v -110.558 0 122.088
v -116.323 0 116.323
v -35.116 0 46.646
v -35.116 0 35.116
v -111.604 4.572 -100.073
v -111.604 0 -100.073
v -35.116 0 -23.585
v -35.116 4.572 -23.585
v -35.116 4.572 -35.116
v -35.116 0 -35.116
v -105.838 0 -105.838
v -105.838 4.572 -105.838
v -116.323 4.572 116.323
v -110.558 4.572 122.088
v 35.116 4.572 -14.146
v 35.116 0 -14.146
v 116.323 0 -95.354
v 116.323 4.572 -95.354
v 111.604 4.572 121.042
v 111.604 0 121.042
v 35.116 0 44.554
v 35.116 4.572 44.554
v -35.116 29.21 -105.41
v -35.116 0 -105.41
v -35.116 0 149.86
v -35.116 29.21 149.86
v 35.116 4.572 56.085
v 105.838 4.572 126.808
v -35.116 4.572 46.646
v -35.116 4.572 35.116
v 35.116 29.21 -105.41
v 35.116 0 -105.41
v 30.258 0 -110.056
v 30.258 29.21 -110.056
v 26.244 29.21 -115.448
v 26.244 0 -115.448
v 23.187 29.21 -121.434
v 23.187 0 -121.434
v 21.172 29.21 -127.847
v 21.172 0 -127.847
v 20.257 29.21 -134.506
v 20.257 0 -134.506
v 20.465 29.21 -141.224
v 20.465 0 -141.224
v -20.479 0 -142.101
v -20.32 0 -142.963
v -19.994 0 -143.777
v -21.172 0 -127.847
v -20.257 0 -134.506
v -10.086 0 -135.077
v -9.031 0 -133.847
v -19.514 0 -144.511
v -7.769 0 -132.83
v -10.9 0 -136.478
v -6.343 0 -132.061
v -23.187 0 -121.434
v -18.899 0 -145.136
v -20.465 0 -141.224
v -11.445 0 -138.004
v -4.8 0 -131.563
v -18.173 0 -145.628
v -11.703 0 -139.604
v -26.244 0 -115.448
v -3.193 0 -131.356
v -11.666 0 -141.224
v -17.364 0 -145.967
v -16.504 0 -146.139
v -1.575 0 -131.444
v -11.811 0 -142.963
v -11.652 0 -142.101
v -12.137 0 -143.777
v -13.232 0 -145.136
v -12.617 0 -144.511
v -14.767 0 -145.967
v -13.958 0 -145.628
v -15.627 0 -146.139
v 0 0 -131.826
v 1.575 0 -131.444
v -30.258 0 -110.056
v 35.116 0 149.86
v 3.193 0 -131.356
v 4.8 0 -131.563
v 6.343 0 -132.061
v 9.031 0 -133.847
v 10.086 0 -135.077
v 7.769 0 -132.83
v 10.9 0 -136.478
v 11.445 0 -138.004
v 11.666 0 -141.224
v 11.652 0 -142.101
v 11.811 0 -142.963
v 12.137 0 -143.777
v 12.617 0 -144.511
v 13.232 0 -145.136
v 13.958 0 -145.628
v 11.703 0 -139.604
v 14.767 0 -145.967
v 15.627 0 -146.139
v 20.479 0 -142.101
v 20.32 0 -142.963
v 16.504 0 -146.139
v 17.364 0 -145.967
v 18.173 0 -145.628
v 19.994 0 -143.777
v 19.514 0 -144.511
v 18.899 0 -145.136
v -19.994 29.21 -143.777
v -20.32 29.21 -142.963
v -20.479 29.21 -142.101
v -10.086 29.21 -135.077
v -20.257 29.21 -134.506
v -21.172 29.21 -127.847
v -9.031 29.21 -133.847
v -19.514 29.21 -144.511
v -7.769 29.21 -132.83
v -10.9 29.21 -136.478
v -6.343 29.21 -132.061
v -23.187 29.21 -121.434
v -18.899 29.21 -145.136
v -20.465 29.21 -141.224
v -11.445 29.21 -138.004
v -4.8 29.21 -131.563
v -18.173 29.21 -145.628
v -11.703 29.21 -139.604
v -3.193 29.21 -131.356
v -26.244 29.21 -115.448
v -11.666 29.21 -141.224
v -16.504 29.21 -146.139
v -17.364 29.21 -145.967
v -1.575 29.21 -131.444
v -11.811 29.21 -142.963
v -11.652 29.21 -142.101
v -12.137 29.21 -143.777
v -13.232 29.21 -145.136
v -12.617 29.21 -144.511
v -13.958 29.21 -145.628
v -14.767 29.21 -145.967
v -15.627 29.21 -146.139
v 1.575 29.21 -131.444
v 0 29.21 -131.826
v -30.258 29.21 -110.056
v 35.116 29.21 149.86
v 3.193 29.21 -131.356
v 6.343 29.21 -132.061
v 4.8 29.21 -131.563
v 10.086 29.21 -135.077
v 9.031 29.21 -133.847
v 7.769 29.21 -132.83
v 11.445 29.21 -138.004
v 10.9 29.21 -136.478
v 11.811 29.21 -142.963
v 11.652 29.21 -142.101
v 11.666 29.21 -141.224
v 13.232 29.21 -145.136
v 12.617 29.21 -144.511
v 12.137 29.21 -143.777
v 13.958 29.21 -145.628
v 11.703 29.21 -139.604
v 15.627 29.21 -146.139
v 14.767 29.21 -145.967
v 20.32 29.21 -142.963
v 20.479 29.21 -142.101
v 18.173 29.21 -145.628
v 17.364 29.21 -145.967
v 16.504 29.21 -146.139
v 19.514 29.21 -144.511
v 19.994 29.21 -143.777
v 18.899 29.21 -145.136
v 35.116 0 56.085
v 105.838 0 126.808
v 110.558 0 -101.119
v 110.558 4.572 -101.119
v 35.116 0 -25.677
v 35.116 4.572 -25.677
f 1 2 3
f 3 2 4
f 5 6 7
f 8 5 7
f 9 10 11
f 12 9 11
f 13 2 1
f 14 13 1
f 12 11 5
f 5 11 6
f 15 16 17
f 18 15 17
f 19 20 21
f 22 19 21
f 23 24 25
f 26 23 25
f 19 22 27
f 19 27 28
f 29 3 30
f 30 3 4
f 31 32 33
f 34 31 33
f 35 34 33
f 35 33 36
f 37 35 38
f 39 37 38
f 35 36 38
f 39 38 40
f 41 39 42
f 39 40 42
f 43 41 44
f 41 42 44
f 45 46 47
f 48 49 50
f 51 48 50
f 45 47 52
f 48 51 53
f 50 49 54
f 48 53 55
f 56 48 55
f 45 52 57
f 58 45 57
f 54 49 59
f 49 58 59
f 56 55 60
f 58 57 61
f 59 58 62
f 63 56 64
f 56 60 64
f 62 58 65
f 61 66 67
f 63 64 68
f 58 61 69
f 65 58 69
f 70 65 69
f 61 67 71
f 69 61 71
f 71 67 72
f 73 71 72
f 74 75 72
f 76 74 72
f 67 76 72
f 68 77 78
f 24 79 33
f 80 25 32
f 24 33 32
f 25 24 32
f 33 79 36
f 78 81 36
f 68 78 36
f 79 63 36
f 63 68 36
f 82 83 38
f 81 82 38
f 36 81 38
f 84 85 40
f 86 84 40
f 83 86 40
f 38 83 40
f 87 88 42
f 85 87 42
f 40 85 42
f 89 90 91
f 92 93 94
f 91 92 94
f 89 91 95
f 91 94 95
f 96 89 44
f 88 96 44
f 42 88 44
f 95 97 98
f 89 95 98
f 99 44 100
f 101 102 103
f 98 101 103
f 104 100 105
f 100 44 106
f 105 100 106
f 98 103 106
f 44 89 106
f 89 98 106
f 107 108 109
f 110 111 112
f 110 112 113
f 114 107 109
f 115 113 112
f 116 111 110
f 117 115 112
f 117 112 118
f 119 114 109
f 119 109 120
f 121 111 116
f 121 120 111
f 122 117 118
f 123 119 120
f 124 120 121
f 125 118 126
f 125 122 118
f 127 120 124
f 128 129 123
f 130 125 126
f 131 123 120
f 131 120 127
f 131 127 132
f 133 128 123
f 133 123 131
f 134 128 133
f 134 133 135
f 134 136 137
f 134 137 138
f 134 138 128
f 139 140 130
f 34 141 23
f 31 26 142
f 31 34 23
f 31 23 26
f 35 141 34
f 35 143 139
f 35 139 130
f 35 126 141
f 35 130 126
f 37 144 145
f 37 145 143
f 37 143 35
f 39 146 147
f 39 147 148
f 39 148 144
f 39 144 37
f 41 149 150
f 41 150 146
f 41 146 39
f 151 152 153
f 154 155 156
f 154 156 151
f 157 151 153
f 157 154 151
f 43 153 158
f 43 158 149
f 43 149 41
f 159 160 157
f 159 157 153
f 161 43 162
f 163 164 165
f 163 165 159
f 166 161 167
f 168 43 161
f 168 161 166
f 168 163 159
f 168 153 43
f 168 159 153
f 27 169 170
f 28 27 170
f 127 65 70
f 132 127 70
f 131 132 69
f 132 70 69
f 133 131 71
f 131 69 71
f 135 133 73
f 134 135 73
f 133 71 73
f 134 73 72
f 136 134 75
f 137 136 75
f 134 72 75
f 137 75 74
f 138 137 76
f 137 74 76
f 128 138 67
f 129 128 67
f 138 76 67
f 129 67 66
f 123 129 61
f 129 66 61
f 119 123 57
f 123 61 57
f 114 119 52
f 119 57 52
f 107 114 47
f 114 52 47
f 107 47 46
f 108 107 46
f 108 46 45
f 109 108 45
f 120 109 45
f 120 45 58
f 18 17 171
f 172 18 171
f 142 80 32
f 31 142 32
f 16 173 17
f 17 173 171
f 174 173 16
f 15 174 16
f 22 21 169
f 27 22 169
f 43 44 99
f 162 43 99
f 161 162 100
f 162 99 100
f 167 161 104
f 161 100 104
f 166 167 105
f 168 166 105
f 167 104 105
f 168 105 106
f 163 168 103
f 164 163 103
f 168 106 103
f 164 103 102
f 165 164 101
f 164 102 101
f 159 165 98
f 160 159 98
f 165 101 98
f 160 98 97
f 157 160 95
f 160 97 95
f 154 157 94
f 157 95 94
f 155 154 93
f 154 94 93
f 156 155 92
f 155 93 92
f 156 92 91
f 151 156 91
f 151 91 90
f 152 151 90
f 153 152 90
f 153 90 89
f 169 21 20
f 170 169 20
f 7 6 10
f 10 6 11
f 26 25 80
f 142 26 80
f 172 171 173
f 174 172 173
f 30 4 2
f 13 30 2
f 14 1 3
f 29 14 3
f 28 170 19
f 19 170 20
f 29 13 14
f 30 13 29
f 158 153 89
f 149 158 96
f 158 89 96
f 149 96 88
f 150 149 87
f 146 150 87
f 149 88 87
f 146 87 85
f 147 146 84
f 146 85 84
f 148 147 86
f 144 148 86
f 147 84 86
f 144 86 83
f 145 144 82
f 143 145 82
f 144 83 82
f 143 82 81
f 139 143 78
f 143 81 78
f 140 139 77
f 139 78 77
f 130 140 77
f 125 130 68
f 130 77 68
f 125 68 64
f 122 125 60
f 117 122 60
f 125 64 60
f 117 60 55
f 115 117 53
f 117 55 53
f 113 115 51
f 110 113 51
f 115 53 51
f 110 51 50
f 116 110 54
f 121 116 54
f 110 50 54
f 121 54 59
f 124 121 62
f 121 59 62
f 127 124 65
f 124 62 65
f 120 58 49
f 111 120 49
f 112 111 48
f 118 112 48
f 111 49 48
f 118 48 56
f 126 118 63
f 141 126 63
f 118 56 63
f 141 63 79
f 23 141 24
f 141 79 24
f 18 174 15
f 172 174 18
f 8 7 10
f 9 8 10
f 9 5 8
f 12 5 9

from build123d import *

# Parameters (mm, degrees)
BODY_DEPTH     = 29.21
ARM4_START     = -30.861
SKETCH3_W      = 8.1534
SKETCH3_H      = 4.572
ARM4_DEPTH     = 132.461
ARMS_COUNT     = 4
SPLIT1_DEPTH   = 4.572
SPLIT1_2_DEPTH = 4.572
SPLIT1_3_DEPTH = 4.572
SPLIT1_4_DEPTH = 4.572
SPLIT1_5_DEPTH = 4.572


# Read off the part's stored shape, not the designer's step: Split1
with BuildPart() as part:
    # Sketch1 → Body (new body)
    with BuildSketch(Plane(origin=(0, 0, 0), x_dir=(1, 0, 0), z_dir=(0, 1, 0))):
        with BuildLine():
            Line((-35.1155, -149.86), (35.1155, -149.86))
            Line((35.1155, -149.86), (35.1155, 105.41))
            ThreePointArc((35.1155, 105.41), (23.187155862, 121.433970368), (20.465438127, 141.224))
            ThreePointArc((20.465438127, 141.224), (16.0655, 146.16116691), (11.665561873, 141.224))
            ThreePointArc((11.665561873, 141.224), (8.42304611, 133.309752218), (0, 131.826))
            ThreePointArc((0, 131.826), (-8.42304611, 133.309752218), (-11.665561873, 141.224))
            ThreePointArc((-11.665561873, 141.224), (-16.0655, 146.16116691), (-20.465438127, 141.224))
            ThreePointArc((-20.465438127, 141.224), (-23.187155862, 121.433970368), (-35.1155, 105.41))
            Line((-35.1155, 105.41), (-35.1155, -149.86))
        make_face()
    extrude(amount=BODY_DEPTH)

    # Sketch3 → Arm4 (add)
    with BuildSketch(Plane(origin=(-33.996333455, 0, -33.996333455), x_dir=(-0.7071067811865487, 0, 0.7071067811865465), z_dir=(-0.7071067811865465, 0, -0.7071067811865487)).offset(ARM4_START)):
        with Locations((4.0767, 2.286)):
            Rectangle(SKETCH3_W, SKETCH3_H)
    arm4 = extrude(amount=ARM4_DEPTH)

    # Arms: Arm4 ×4 about axis
    arms_axis = Axis((0, 0, 10.484577686), (0, 1, 0))
    for i in range(1, ARMS_COUNT):
        add(arm4.rotate(arms_axis, i * 360 / ARMS_COUNT))

    # Split1 outline → Split1 (cut)
    with BuildSketch(Plane(origin=(0, 0, 0), x_dir=(1, 0, 0), z_dir=(0, 1, 0))):
        Polygon((-35.1155, 23.584851141), (-35.1155, 35.1155), (-105.838382424, 105.838382424), (-111.603706853, 100.073057994), align=None)
        Polygon((-35.1155, -46.646148859), (-35.1155, -35.1155), (-116.322960109, -116.322960109), (-110.55763568, -122.088284539), align=None)
        Polygon((35.1155, -44.554006512), (35.1155, -56.084655371), (105.838382424, -126.807537795), (111.603706853, -121.042213365), align=None)
        Polygon((35.1155, 25.676993488), (35.1155, 14.146344629), (116.322960109, 95.353804738), (110.55763568, 101.119129168), align=None)
    extrude(amount=SPLIT1_DEPTH, mode=Mode.SUBTRACT)


with BuildPart() as body_2:
    # Split1 2 outline → Split1 2 (new body)
    with BuildSketch(Plane(origin=(0, 0, 0), x_dir=(1, 0, 0), z_dir=(0, 1, 0))):
        Polygon((-35.1155, -46.646148859), (-35.1155, -35.1155), (-116.322960109, -116.322960109), (-110.55763568, -122.088284539), align=None)
    extrude(amount=SPLIT1_2_DEPTH)


with BuildPart() as body_3:
    # Split1 3 outline → Split1 3 (new body)
    with BuildSketch(Plane(origin=(0, 0, 0), x_dir=(1, 0, 0), z_dir=(0, 1, 0))):
        Polygon((-35.1155, 23.584851141), (-35.1155, 35.1155), (-105.838382424, 105.838382424), (-111.603706853, 100.073057994), align=None)
    extrude(amount=SPLIT1_3_DEPTH)


with BuildPart() as body_4:
    # Split1 4 outline → Split1 4 (new body)
    with BuildSketch(Plane(origin=(0, 0, 0), x_dir=(1, 0, 0), z_dir=(0, 1, 0))):
        Polygon((35.1155, 25.676993488), (35.1155, 14.146344629), (116.322960109, 95.353804738), (110.55763568, 101.119129168), align=None)
    extrude(amount=SPLIT1_4_DEPTH)


with BuildPart() as body_5:
    # Split1 5 outline → Split1 5 (new body)
    with BuildSketch(Plane(origin=(0, 0, 0), x_dir=(1, 0, 0), z_dir=(0, 1, 0))):
        Polygon((35.1155, -44.554006512), (35.1155, -56.084655371), (105.838382424, -126.807537795), (111.603706853, -121.042213365), align=None)
    extrude(amount=SPLIT1_5_DEPTH)


solid = Compound([part.part, body_2.part, body_3.part, body_4.part, body_5.part])
